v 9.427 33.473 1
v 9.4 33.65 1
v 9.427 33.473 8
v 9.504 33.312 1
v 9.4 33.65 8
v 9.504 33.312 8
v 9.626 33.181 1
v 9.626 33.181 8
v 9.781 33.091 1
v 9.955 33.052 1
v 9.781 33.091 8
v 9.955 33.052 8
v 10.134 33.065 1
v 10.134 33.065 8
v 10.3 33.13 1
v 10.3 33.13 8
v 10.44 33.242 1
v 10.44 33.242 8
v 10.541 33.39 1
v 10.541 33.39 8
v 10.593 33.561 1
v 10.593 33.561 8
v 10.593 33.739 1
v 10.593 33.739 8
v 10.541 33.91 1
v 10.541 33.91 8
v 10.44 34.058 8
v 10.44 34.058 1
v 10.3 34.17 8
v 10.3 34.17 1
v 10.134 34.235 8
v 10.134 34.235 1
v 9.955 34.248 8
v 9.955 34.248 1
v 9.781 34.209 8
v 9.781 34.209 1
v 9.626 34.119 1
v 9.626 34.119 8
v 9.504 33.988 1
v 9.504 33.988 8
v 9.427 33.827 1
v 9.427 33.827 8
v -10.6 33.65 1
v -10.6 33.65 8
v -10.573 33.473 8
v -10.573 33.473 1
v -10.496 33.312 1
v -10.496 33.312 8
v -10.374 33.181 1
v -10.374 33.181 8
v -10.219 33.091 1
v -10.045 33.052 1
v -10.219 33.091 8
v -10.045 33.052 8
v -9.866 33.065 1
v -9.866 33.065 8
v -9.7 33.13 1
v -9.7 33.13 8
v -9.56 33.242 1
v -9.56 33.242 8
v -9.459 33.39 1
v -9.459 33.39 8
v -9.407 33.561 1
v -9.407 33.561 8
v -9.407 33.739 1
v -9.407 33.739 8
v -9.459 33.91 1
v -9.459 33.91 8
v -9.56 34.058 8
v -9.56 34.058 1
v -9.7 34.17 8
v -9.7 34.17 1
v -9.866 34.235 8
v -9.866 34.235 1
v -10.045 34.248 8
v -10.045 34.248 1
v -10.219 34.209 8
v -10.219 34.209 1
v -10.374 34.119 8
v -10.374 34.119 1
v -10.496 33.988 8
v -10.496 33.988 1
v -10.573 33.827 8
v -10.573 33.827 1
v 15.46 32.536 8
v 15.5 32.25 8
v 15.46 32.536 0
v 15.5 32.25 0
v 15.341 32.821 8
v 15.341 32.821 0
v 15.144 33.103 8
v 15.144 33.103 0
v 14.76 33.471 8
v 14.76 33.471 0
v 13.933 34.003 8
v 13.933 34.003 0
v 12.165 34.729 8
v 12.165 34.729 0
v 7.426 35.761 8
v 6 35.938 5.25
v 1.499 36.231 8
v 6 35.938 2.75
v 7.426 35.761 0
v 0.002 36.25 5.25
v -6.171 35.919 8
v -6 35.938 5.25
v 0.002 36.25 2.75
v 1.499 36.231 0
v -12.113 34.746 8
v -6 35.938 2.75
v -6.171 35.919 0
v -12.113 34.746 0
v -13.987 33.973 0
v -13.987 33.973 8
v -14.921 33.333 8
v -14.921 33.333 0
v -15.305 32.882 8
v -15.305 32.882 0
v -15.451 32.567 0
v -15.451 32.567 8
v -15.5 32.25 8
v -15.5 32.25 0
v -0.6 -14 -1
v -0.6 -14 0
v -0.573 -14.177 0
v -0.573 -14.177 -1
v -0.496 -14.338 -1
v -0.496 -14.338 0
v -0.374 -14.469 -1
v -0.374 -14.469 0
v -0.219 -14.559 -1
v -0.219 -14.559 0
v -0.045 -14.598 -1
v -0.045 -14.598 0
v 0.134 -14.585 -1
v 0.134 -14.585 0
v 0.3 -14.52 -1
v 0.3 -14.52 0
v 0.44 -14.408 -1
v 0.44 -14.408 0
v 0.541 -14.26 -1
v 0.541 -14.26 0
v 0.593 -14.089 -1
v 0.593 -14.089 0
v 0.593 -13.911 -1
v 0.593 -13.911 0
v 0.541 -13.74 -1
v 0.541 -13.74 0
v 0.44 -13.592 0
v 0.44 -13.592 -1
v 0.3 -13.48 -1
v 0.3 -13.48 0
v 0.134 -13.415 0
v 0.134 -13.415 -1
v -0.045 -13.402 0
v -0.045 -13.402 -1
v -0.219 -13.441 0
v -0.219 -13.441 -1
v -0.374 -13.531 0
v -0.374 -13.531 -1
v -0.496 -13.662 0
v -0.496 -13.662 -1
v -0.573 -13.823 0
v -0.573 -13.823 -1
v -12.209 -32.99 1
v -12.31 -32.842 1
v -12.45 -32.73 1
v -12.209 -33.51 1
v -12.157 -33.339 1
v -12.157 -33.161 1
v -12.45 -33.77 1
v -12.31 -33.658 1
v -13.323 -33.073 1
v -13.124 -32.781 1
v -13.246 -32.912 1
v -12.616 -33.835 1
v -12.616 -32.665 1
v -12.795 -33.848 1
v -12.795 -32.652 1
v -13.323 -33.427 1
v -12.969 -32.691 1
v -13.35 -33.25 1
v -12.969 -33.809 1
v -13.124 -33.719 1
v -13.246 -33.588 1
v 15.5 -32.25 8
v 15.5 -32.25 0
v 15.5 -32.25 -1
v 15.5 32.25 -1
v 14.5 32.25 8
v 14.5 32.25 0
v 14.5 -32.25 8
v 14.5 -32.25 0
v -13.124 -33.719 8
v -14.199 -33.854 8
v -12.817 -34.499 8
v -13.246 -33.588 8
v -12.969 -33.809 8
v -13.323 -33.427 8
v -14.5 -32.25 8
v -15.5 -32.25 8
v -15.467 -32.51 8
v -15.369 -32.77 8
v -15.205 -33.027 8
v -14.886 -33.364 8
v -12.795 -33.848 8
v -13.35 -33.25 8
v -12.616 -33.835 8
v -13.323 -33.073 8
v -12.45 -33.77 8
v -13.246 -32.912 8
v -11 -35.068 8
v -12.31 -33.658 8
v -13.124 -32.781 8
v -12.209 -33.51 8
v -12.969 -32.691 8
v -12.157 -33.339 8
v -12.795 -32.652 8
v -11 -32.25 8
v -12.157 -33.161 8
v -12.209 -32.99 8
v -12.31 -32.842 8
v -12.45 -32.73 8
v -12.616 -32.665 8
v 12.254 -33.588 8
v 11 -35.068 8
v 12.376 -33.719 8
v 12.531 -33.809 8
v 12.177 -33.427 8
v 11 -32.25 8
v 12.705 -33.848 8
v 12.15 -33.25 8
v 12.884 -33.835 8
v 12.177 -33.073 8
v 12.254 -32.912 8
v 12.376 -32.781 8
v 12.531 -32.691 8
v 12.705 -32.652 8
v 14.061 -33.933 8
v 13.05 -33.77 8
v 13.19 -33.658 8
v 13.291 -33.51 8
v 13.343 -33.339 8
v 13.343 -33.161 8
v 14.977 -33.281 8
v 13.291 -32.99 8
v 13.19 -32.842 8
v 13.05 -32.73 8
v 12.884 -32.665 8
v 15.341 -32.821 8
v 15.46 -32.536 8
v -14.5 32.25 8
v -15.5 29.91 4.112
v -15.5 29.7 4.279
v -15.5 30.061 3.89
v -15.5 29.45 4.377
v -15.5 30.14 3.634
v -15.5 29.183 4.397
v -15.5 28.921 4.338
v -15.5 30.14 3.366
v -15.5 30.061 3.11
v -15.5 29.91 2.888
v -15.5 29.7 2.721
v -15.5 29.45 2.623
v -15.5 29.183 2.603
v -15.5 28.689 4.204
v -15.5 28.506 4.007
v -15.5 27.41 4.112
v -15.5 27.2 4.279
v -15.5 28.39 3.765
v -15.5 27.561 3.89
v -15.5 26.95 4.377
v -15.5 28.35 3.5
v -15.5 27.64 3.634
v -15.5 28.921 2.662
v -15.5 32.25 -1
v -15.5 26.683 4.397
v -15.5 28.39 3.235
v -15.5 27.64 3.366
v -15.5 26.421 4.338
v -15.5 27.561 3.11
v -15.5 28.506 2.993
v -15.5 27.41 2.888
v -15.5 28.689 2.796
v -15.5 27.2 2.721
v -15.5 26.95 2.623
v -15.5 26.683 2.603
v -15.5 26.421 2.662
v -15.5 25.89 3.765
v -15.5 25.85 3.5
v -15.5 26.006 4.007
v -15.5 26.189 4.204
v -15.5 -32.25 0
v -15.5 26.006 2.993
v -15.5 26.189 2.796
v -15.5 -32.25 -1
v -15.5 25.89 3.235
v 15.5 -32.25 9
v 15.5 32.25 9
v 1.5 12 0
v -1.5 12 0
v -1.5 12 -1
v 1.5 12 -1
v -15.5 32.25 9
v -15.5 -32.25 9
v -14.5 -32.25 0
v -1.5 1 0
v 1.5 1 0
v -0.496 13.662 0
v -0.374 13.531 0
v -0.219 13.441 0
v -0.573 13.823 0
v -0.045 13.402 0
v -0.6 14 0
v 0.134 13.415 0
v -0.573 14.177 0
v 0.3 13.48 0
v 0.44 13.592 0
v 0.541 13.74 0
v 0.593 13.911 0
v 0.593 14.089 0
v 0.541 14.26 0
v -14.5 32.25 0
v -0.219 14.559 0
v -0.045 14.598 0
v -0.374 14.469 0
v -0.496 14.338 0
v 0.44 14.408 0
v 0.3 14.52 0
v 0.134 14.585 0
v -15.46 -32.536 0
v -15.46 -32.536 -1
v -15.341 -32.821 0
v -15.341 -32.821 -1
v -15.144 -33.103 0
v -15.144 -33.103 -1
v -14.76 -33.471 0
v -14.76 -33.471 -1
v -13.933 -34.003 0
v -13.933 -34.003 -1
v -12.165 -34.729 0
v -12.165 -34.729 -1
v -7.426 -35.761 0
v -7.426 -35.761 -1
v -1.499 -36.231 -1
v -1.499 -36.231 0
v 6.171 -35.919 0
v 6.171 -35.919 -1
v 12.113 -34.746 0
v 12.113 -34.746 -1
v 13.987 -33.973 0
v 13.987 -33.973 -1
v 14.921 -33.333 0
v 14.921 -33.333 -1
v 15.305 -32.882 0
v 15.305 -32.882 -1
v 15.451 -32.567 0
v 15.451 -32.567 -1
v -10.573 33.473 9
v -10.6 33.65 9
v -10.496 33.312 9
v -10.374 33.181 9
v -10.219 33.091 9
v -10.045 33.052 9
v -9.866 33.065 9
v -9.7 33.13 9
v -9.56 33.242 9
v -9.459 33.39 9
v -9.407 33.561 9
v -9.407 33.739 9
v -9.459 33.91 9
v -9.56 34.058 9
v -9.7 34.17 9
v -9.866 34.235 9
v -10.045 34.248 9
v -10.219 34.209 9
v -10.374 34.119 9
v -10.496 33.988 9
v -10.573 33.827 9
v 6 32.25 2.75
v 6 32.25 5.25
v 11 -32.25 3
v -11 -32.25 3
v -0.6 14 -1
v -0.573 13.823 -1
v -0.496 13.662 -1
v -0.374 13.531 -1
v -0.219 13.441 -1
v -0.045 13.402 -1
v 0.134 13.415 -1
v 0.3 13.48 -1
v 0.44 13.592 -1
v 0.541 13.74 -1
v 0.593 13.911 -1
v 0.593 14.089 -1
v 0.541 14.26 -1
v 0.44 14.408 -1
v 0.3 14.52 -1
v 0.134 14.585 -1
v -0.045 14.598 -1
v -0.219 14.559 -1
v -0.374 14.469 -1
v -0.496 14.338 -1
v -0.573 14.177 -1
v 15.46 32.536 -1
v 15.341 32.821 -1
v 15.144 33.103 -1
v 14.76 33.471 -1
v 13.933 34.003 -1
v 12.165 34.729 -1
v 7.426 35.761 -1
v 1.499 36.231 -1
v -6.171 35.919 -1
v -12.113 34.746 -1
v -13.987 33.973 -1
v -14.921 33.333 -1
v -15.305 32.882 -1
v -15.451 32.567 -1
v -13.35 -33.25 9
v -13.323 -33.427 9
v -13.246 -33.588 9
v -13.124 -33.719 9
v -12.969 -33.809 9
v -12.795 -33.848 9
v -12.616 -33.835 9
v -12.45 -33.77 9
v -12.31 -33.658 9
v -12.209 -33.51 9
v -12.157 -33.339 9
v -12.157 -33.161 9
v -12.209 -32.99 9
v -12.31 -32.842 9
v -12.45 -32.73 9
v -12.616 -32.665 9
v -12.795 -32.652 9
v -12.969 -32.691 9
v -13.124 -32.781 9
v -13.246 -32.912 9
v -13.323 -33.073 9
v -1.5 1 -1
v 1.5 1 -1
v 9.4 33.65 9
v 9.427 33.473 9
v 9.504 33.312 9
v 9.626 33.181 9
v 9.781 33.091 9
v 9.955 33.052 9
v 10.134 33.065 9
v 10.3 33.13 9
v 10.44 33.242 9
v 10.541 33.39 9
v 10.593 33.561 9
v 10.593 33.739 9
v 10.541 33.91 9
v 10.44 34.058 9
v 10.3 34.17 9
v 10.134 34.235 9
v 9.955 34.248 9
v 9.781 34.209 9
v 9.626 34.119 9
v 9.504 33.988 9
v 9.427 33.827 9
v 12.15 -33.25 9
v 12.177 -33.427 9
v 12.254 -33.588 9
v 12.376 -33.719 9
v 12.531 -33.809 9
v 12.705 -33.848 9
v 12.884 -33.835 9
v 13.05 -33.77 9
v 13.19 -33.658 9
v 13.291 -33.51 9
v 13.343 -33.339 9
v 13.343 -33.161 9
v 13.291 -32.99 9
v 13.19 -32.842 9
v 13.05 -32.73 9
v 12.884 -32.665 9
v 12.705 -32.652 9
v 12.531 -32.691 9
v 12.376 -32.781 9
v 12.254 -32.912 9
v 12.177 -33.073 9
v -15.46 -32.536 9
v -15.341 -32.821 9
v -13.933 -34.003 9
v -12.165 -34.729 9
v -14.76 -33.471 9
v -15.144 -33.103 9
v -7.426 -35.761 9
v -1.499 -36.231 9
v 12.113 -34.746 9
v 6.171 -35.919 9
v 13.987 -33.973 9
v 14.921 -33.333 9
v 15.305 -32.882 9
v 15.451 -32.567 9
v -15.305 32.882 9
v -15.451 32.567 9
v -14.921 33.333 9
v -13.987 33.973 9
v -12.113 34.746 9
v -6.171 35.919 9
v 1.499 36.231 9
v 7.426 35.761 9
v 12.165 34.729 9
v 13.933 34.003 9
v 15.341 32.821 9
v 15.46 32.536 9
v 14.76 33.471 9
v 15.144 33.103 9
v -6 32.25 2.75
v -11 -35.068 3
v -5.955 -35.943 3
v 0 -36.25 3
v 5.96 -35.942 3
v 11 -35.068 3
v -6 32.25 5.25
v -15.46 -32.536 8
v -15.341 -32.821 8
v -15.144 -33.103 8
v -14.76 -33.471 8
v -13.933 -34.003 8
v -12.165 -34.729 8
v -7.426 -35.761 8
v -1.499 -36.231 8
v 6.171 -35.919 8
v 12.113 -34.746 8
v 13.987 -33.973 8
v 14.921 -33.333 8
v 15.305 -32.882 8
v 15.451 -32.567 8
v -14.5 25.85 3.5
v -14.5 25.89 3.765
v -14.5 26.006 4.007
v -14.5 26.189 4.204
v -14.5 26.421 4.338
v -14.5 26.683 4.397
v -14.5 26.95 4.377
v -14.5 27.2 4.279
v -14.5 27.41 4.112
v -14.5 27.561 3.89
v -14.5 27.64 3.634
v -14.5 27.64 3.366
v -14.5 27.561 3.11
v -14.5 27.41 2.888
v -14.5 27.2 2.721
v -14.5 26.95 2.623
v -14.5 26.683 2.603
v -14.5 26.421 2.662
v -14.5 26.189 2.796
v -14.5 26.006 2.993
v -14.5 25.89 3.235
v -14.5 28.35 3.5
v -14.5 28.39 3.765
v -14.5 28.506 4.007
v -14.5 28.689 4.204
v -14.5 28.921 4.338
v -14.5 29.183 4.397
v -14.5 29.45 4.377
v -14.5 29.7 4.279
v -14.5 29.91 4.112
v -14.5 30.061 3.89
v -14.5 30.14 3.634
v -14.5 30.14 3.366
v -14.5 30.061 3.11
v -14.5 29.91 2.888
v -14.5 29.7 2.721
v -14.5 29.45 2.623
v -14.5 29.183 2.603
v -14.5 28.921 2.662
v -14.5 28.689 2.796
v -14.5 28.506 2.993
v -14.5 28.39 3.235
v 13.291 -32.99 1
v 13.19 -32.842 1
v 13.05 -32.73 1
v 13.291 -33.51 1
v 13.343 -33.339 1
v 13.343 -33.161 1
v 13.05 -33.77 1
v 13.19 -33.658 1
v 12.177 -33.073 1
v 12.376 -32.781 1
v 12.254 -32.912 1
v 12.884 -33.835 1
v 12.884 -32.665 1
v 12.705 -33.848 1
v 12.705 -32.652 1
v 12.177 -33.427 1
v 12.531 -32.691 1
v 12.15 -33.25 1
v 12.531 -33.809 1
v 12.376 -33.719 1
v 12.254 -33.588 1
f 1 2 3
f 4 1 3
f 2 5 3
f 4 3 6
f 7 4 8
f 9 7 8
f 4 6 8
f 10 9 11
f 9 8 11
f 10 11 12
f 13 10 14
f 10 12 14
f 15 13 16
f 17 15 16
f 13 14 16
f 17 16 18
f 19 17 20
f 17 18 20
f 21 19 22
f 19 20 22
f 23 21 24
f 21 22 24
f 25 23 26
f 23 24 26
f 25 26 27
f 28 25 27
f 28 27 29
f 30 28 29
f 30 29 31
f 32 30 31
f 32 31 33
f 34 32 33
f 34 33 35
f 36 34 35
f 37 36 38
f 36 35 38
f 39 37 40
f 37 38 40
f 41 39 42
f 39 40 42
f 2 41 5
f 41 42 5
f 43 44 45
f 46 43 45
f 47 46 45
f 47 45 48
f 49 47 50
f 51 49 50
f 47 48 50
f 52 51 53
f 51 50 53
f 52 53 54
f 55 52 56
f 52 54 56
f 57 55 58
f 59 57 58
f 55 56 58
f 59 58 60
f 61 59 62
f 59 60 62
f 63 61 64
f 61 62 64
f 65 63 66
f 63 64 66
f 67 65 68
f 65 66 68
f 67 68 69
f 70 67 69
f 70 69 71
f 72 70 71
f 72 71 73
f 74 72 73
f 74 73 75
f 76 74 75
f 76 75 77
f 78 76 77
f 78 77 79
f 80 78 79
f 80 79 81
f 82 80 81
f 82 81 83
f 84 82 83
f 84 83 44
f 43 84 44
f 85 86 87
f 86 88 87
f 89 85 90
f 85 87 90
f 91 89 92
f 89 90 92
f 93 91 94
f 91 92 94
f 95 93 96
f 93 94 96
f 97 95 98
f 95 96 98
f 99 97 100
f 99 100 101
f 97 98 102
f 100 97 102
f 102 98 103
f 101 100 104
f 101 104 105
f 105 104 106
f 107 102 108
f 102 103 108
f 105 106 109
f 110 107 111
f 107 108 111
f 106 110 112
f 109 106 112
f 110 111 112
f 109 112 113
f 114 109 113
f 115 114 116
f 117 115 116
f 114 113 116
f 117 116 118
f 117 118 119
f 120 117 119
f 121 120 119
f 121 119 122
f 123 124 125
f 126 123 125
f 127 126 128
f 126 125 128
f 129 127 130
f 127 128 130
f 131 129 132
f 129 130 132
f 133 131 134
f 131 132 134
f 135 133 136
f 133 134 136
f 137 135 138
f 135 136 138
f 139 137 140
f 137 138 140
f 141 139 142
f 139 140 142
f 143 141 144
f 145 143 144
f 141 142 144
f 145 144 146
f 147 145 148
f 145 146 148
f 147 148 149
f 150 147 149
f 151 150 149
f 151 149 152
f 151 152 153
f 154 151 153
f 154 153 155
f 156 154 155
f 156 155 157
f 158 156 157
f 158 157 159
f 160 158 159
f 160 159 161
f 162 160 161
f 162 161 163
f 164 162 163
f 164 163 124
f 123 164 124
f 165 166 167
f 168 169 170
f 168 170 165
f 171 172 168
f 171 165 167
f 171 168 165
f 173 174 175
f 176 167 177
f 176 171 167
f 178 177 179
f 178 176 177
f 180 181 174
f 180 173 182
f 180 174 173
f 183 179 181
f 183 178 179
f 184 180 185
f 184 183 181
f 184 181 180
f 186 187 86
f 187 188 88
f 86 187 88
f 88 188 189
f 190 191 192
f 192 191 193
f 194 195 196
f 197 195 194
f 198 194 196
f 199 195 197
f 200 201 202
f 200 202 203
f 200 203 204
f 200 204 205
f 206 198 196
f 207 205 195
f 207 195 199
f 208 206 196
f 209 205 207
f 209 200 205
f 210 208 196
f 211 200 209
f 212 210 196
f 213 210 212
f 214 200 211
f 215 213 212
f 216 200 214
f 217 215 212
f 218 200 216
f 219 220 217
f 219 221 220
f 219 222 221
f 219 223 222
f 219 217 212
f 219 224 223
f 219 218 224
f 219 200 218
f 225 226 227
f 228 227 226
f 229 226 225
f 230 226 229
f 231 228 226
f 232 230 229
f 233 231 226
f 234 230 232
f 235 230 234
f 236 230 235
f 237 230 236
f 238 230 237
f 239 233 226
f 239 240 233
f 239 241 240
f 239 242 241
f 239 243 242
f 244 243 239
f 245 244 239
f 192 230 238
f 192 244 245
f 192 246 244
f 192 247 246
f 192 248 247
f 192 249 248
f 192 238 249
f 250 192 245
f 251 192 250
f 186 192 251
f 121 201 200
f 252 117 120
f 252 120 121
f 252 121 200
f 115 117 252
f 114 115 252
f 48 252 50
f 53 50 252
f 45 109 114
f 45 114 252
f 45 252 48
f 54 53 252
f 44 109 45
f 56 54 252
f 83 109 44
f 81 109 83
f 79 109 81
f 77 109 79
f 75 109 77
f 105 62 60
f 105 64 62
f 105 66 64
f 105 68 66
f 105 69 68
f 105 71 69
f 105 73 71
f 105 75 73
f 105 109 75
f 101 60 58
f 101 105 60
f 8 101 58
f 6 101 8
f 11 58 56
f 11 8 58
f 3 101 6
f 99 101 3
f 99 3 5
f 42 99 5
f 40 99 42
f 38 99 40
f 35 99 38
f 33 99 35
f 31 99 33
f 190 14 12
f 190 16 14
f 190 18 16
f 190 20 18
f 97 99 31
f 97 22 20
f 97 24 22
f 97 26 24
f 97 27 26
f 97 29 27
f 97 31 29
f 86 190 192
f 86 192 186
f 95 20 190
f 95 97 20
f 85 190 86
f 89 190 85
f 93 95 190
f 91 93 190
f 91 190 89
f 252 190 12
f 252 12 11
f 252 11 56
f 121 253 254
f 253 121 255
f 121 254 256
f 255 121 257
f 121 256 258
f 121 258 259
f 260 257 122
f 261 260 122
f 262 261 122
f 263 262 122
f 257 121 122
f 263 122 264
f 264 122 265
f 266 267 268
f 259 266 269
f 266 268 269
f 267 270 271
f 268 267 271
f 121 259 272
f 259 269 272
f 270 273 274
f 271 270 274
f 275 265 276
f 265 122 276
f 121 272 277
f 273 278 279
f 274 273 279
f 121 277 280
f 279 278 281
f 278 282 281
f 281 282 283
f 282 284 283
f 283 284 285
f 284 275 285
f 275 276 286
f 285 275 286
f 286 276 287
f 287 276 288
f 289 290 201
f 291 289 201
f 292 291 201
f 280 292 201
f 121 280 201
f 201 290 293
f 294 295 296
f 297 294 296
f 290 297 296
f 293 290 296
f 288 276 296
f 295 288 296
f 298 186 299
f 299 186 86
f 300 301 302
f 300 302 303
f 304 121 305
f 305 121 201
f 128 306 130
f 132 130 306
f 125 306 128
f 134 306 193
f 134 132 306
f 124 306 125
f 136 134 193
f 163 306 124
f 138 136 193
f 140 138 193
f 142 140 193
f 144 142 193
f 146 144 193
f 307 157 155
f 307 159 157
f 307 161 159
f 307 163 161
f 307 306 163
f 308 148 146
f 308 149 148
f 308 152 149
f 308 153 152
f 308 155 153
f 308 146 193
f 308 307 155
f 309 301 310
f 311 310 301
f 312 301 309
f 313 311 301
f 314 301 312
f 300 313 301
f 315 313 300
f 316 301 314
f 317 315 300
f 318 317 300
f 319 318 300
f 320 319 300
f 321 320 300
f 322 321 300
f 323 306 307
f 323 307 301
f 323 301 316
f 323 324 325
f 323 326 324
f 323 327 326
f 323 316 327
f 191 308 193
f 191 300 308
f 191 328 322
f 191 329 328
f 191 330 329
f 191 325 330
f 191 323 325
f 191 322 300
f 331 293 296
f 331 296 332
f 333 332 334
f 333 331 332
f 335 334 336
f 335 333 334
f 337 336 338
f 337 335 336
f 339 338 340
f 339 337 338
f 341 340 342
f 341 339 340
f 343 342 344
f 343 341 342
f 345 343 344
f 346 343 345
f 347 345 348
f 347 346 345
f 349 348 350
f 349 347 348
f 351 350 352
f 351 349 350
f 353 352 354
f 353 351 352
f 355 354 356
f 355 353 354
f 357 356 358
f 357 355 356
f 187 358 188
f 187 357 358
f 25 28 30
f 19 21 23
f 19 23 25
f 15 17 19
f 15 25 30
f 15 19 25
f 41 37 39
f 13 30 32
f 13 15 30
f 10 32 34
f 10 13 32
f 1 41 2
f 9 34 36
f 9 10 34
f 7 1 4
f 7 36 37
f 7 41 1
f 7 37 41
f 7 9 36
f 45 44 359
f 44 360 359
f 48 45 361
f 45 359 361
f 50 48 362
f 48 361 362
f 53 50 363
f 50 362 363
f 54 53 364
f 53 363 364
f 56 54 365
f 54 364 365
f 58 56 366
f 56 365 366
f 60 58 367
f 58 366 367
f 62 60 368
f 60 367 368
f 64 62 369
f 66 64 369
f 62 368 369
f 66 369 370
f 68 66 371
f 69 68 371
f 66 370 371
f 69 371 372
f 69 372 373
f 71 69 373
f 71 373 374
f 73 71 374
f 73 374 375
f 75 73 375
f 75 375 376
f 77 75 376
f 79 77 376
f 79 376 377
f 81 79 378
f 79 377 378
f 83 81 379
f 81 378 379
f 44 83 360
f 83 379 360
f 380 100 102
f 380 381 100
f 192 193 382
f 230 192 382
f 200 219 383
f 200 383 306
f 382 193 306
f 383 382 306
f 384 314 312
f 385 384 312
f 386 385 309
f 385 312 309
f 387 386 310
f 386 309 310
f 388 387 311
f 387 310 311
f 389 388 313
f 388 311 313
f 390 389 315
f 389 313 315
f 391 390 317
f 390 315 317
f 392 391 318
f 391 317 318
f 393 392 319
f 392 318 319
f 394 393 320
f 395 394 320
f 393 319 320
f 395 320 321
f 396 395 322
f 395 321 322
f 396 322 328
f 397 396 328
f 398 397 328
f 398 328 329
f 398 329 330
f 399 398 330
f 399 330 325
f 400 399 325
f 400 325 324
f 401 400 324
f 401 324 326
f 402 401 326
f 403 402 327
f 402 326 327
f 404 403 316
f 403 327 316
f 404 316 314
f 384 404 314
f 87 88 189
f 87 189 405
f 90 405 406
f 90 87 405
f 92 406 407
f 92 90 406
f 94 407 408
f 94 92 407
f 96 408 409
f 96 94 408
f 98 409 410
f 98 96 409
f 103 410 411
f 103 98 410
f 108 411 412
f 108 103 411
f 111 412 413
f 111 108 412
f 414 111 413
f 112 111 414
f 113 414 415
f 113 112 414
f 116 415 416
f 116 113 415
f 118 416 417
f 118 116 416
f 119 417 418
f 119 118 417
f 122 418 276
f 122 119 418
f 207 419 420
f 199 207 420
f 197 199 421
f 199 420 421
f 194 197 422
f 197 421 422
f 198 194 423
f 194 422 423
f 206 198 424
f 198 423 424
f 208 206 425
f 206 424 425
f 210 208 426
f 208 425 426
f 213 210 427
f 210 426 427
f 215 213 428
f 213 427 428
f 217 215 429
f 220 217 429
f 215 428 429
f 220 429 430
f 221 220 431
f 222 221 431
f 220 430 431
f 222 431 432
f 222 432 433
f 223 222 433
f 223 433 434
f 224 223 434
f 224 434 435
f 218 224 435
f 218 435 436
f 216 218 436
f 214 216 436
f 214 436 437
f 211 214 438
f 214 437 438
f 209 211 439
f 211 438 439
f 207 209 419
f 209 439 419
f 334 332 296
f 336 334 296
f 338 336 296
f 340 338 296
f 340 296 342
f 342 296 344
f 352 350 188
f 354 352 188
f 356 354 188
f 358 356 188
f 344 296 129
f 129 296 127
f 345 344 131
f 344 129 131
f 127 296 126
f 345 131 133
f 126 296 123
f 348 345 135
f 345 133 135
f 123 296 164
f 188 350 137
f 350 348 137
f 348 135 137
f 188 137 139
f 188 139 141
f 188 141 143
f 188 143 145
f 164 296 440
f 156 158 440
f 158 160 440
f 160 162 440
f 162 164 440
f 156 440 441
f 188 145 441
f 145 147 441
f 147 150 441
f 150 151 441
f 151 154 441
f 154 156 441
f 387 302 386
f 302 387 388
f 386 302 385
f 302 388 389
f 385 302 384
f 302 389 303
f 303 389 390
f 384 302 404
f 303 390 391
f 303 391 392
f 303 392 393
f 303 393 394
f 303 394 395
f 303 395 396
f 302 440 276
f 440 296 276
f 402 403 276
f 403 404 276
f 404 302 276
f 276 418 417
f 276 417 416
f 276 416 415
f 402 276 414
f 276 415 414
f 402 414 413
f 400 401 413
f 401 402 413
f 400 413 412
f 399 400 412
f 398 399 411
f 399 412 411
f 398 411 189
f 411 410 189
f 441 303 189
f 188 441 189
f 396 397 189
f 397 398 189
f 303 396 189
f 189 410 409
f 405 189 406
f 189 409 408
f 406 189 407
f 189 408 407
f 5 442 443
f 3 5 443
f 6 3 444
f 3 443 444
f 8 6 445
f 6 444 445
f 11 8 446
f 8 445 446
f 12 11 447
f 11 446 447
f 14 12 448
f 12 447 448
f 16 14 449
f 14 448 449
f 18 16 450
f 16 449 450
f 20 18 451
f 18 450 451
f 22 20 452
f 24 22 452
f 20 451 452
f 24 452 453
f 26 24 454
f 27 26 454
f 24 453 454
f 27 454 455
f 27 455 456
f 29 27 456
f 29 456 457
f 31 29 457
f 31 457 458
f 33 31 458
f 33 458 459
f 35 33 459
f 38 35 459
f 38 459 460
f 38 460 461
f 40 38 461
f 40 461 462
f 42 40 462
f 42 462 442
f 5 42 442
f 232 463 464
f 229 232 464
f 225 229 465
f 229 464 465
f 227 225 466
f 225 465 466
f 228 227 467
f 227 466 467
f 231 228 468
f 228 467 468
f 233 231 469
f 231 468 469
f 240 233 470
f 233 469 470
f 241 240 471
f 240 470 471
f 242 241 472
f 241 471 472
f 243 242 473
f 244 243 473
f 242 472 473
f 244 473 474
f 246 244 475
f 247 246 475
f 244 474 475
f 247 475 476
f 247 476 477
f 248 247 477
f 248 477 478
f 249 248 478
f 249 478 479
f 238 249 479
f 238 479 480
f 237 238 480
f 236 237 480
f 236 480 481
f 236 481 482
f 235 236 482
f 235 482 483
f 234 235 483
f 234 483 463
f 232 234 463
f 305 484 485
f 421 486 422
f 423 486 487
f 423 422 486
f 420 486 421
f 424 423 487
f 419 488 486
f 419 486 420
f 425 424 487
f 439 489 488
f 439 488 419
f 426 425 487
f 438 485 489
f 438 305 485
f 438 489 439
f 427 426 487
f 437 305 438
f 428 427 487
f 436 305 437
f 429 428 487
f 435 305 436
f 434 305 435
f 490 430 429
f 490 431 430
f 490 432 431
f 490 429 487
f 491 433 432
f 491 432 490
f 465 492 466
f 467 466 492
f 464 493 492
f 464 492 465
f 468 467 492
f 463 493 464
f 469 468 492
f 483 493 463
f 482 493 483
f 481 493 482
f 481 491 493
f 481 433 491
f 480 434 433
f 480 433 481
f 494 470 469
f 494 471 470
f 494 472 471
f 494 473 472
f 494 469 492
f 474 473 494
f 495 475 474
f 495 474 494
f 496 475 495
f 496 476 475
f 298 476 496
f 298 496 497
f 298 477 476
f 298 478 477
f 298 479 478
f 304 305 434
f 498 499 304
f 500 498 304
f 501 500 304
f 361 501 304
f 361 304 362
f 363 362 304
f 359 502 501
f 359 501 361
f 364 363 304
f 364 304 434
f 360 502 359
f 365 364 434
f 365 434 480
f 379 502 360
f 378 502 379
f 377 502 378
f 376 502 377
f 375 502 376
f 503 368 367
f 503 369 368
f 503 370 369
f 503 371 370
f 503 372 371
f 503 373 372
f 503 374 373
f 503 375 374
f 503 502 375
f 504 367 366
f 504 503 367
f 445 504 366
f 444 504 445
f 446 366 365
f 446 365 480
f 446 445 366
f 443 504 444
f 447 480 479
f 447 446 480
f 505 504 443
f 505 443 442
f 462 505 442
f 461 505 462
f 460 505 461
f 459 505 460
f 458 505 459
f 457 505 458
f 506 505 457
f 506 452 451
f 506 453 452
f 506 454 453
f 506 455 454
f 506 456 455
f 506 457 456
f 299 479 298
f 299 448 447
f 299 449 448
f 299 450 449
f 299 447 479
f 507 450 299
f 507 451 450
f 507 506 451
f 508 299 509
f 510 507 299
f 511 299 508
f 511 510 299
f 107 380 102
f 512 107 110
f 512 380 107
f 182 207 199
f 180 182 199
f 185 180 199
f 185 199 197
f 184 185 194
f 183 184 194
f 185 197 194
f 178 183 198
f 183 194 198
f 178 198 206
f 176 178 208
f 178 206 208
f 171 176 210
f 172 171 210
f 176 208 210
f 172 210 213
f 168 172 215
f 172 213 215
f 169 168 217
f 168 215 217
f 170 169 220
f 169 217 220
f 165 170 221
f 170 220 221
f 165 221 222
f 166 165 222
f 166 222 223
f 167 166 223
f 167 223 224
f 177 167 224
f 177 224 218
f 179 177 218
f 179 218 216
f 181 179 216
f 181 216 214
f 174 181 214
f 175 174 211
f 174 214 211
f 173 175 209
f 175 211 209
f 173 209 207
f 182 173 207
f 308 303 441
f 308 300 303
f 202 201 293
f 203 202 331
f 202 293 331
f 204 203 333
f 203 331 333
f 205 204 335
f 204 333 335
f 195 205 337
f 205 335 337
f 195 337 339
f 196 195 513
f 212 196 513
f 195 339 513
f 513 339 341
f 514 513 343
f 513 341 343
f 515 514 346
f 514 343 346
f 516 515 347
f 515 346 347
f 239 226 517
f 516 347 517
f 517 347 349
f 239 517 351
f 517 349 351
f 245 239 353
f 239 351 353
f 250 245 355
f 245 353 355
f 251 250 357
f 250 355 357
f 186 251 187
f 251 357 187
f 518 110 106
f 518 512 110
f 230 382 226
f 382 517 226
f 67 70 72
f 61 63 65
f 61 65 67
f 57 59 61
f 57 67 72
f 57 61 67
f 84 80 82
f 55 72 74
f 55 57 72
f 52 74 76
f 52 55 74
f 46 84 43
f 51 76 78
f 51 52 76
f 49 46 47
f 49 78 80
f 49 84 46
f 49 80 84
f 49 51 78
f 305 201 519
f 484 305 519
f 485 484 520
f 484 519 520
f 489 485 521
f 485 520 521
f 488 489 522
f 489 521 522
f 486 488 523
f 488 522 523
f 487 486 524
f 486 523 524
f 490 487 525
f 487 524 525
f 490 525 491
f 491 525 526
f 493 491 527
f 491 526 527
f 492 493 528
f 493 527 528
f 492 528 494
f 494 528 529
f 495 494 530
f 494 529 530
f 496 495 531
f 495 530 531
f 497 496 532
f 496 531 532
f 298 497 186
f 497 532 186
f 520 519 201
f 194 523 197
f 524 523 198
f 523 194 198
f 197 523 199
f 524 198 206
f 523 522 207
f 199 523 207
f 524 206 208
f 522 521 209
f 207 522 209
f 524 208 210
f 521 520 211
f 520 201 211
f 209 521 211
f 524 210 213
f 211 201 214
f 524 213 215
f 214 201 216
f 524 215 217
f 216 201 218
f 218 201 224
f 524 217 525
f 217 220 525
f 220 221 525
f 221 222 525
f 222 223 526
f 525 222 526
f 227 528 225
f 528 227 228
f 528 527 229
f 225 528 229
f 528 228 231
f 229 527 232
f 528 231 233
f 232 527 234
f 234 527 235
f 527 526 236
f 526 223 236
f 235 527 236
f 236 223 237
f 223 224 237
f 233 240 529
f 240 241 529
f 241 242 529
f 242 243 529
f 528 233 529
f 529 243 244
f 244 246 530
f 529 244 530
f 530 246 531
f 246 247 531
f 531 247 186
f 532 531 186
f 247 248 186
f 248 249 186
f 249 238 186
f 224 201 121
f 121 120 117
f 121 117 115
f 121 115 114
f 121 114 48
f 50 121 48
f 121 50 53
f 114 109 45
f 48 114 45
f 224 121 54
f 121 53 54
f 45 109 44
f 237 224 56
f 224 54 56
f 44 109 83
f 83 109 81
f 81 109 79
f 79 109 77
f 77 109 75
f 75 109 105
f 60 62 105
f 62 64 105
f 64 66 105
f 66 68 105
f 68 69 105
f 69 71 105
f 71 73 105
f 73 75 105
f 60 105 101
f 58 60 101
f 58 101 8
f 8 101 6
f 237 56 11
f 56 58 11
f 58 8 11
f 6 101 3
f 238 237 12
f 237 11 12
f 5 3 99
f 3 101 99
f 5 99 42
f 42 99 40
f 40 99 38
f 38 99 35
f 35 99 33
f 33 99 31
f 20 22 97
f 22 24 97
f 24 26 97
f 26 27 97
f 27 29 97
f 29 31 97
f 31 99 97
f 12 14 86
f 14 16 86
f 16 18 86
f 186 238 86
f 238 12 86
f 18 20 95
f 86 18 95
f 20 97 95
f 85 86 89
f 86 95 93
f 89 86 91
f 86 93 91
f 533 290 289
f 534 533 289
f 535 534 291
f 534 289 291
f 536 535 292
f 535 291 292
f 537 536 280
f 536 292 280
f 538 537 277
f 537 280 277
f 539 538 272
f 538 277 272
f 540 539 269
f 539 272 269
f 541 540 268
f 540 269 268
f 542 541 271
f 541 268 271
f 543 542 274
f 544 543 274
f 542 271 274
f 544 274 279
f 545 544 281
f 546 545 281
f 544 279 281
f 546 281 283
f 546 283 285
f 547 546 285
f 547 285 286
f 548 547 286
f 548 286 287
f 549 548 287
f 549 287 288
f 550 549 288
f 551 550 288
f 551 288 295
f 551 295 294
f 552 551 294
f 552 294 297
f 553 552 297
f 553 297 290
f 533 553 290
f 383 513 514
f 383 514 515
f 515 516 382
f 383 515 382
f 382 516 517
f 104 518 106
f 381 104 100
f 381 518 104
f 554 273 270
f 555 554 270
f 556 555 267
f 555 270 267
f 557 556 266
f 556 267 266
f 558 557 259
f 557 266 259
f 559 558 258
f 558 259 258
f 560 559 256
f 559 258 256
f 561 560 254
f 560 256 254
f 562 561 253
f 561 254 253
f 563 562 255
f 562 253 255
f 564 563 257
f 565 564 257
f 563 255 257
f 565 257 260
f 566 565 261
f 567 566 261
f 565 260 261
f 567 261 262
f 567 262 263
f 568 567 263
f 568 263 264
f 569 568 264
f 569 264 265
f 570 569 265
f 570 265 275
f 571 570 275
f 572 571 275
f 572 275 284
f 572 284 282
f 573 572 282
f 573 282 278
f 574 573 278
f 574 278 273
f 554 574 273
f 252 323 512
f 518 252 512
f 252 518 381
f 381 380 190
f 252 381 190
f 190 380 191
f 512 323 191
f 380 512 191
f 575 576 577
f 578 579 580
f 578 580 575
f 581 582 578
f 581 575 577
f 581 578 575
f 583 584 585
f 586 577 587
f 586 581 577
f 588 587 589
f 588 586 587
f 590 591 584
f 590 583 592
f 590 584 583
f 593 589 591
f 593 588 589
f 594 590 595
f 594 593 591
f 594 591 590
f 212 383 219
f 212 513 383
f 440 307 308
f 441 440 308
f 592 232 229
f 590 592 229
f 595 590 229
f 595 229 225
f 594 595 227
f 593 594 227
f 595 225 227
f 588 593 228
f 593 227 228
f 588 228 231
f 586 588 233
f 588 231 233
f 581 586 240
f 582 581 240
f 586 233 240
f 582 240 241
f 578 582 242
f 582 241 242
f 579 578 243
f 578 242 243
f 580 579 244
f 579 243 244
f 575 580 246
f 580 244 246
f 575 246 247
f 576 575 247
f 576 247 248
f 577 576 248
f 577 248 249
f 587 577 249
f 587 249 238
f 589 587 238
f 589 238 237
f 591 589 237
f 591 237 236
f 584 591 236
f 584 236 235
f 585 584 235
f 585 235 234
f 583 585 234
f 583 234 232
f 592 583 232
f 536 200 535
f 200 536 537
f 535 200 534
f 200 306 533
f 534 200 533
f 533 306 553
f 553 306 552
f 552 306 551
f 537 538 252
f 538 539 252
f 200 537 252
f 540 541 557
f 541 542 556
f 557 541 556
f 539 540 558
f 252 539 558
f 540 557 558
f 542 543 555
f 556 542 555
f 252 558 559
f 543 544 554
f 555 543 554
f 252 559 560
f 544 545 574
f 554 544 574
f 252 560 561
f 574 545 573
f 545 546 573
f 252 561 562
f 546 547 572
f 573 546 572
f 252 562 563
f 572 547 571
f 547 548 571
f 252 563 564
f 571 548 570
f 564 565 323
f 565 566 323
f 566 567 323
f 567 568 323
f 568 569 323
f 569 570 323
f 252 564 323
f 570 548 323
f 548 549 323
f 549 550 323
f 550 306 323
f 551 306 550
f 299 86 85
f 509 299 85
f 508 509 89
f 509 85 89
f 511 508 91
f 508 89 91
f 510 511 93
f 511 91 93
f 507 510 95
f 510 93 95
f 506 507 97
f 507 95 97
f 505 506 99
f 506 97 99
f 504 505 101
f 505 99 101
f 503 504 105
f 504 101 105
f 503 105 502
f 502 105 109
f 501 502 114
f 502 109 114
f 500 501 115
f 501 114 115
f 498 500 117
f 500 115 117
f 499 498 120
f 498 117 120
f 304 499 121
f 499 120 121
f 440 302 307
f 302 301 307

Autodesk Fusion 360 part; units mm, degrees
sketch "Boceto1" plane through (0, 0, 0) normal (0, 0, 1) x (1, 0, 0)
  line L0 (14.5, -32.25) -> (-14.5, -32.25)
  line L1 (-14.5, -32.25) -> (-14.5, 32.25)
  line L2 (-14.5, 32.25) -> (14.5, 32.25)
  line L3 (14.5, 32.25) -> (14.5, -32.25)
  line L4 (14.5, -32.25) -> (-14.5, 32.25) construction
  line L5 (-14.5, -32.25) -> (14.5, 32.25) construction
  line L6 (-15.5, 32.25) -> (-15.5, -32.25)
  line L7 (15.5, -32.25) -> (15.5, 32.25)
  ellipse E0 centre (0, -32.25) end of major axis (15.5, -32.25) minor radius 4 (-15.5, -32.25) -> (15.5, -32.25) ccw
  line L8 (-14.5, -31.1048) -> (-15.3184, -32.8605) construction
  line L9 (-15.5, 33.25) -> (-14.5, 31.1048) construction
  line L10 (14.5, -31.1048) -> (15.3184, -32.8605) construction
  line L11 (15.3184, 32.8605) -> (14.5, 31.1048) construction
  line L12 (0, 0) -> (-14.3203, -30.7194) construction
  ellipse E1 centre (0, 32.25) end of major axis (15.5, 32.25) minor radius 4 (15.5, 32.25) -> (-15.5, 32.25) ccw
  dimension "d1" = 29
  dimension "d2" = 64.5
  dimension "d5" = 8
  dimension "d6" = 8
extrude "Extruir1" add sketch "Boceto1" against normal blind 1 contours L0 L1 L2 L3 | L6 L7 E0 E1 makes body 1
extrude "Extruir3" add sketch "Boceto1" along normal blind 8 bodies 1
extrude "Extruir4" add sketch "Boceto1" along normal blind 1 from surface at 8 separate body contours L0 L1 L2 L3 | L6 L7 E0 E1 makes body 2
ref_plane "PlanoDeObra1" through (0, -36.25, 0) normal (0, 1, 0) x (0, 0, 1)
sketch "Boceto3" plane through (0, -36.25, 0) normal (0, 1, 0) x (1, 0, 0)
  line L0 (-15.5, -8) -> (-15.5, 1)
  line L1 (15.5, 1) -> (-15.5, 1)
  line L2 (15.5, 1) -> (15.5, -8)
  line L3 (-15.5, -8) -> (15.5, -8)
  line L4 (0, -8) -> (0, -3) construction
  line L5 (0, -3) -> (-11, -3)
  line L6 (0, -3) -> (11, -3)
  line L7 (-11, -3) -> (-11, -8)
  line L8 (11, -3) -> (11, -8)
  line L9 (11, -8) -> (-11, -8)
  dimension "d21" = 5
  dimension "d22" = 11
  dimension "d23" = 11
extrude "Extruir5" cut sketch "Boceto3" along normal blind 14 contours L3 L5 L6 L7 L8 L9 bodies 1
ref_plane "PlanoDeObra2" through (0, 32.25, 4) normal (0, -1, 0) x (1, 0, 0)
sketch "Boceto4" plane through (0, 32.25, 0) normal (0, -1, 0) x (-1, 0, 0)
  line L0 (14.5, 0) -> (-14.5, 0)
  line L1 (-14.5, 0) -> (-14.5, -8)
  line L2 (-14.5, -8) -> (14.5, -8)
  line L3 (14.5, -8) -> (14.5, 0)
  line L4 (0, -8) -> (0, 0) construction
  line L5 (-6, -2.75) -> (6, -2.75)
  line L6 (6, -2.75) -> (6, -5.25)
  line L7 (6, -5.25) -> (-6, -5.25)
  line L8 (-6, -5.25) -> (-6, -2.75)
  line L9 (-6, -2.75) -> (6, -5.25) construction
  line L10 (6, -2.75) -> (-6, -5.25) construction
  point P0 (0, -4)
  dimension "d27" = 12
  dimension "d28" = 2.5
extrude "Extruir6" cut sketch "Boceto4" against normal blind 11 contours L5 L6 L7 L8 bodies 1
sketch "Boceto7" plane through (0, 0, 9) normal (0, 0, 1) x (-1, 0, 0)
  ellipse E0 centre (0, -32.25) end of major axis (-15.5, -32.25) minor radius 4 (-15.5, -32.25) -> (15.5, -32.25) ccw
  line L0 (15.5, -32.25) -> (15.5, 32.25)
  ellipse E1 centre (0, 32.25) end of major axis (-15.5, 32.25) minor radius 4 (15.5, 32.25) -> (-15.5, 32.25) ccw
  line L1 (-15.5, 32.25) -> (-15.5, -32.25)
  line L2 (-11, 32.25) -> (11, 32.25)
  line L3 (11, 32.25) -> (11, 35.0681)
  ellipse E2 centre (0, 32.25) end of major axis (-15.5, 32.25) minor radius 4 (11, 35.0681) -> (-11, 35.0681) ccw
  line L4 (-11, 35.0681) -> (-11, 32.25)
  line L5 (14.5, -32.25) -> (14.5, 32.25)
  line L6 (14.5, 32.25) -> (-14.5, 32.25)
  line L7 (-14.5, 32.25) -> (-14.5, -32.25)
  line L8 (-14.5, -32.25) -> (14.5, -32.25)
  line L9 (-14.5, 32.25) -> (-12.75, 32.25) construction
  line L10 (-12.75, 32.25) -> (-12.75, 33.25) construction
  circle A0 centre (-12.75, 33.25) radius 0.6
  line L11 (14.5, 32.25) -> (12.75, 32.25)
  line L12 (12.75, 32.25) -> (12.75, 33.25) construction
  circle A1 centre (12.75, 33.25) radius 0.6
  line L13 (0, -32.25) -> (0, -36.25)
  line L14 (0, -32.25) -> (10, -32.25)
  line L15 (0, -32.25) -> (-10, -32.25)
  line L16 (-10, -32.25) -> (-10, -33.65) construction
  circle A2 centre (-10, -33.65) radius 0.6
  line L17 (10, -32.25) -> (10, -33.65) construction
  circle A3 centre (10, -33.65) radius 0.6
  dimension "d31" = 1.75
  dimension "d32" = 1
  dimension "d33" = 1.2
  dimension "d34" = 1.75
  dimension "d35" = 1
  dimension "d36" = 1.2
  dimension "d37" = 10
  dimension "d38" = 10
  dimension "d39" = 1.4
  dimension "d40" = 1.2
  dimension "d41" = 1.4
  dimension "d42" = 1.2
extrude "Extruir7" cut sketch "Boceto7" against normal blind 8 contours A0 | A1 | A2 | A3 bodies 1 2
sketch "Boceto8" plane through (-15.5, 0, 0) normal (-1, 0, 0) x (0, -1, 0)
  line L0 (-32.25, 8) -> (-32.25, -1)
  line L1 (-32.25, -1) -> (32.25, -1)
  line L2 (32.25, -1) -> (32.25, 8)
  line L3 (32.25, 8) -> (-32.25, 8)
  line L4 (-32.25, 3.5) -> (-29.25, 3.5) construction
  circle A0 centre (-29.25, 3.5) radius 0.9
  line L5 (-29.25, 3.5) -> (-26.75, 3.5) construction
  circle A1 centre (-26.75, 3.5) radius 0.9
  dimension "d45" = 3
  dimension "d46" = 1.8
  dimension "d47" = 2.5
  dimension "d48" = 1.8
extrude "Extruir8" cut sketch "Boceto8" against normal blind 11 contours A0 | A1 bodies 1
sketch "Boceto10" plane through (0, 0, 0) normal (0, 0, 1) x (-1, 0, 0)
  line L0 (14.5, -32.25) -> (14.5, 32.25)
  line L1 (14.5, 32.25) -> (-14.5, 32.25)
  line L2 (-14.5, 32.25) -> (-14.5, -32.25)
  line L3 (-14.5, -32.25) -> (14.5, -32.25)
  line L4 (-9, 13) -> (9, 13) construction
  line L5 (9, 13) -> (9, -13) construction
  line L6 (9, -13) -> (-9, -13) construction
  line L7 (-9, -13) -> (-9, 13) construction
  line L8 (-9, 13) -> (9, -13) construction
  line L9 (9, 13) -> (-9, -13) construction
  line L10 (0, -13) -> (0, -12) construction
  line L11 (0, -12) -> (1.5, -12)
  line L12 (0, -12) -> (-1.5, -12)
  line L13 (1.5, -12) -> (1.5, -1)
  line L14 (-1.5, -12) -> (-1.5, -1)
  line L15 (1.5, -1) -> (-1.5, -1)
  line L16 (-10, 14) -> (10, 14) construction
  line L17 (10, 14) -> (10, -14) construction
  line L18 (10, -14) -> (-10, -14) construction
  line L19 (-10, -14) -> (-10, 14) construction
  line L20 (-10, 14) -> (10, -14) construction
  line L21 (10, 14) -> (-10, -14) construction
  circle A0 centre (0, -14) radius 0.6
  circle A1 centre (0, 14) radius 0.6
  dimension "d56" = 18
  dimension "d57" = 26
  dimension "d58" = 1
  dimension "d59" = 1.5
  dimension "d60" = 1.5
  dimension "d61" = 11
  dimension "d62" = 11
  dimension "d63" = 20
  dimension "d64" = 28
  dimension "d65" = 1.2
  dimension "d66" = 1.2
extrude "Extruir9" cut sketch "Boceto10" against normal blind 4 contours L11 L12 L13 L14 L15 | A0 | A1 bodies 1
equation "d15 = 5 mm + 3 mm"
equation "d31 = ( 3.5 / 2 ) * 1 mm"
equation "d34 = ( 3.5 / 2 ) * 1 mm"
